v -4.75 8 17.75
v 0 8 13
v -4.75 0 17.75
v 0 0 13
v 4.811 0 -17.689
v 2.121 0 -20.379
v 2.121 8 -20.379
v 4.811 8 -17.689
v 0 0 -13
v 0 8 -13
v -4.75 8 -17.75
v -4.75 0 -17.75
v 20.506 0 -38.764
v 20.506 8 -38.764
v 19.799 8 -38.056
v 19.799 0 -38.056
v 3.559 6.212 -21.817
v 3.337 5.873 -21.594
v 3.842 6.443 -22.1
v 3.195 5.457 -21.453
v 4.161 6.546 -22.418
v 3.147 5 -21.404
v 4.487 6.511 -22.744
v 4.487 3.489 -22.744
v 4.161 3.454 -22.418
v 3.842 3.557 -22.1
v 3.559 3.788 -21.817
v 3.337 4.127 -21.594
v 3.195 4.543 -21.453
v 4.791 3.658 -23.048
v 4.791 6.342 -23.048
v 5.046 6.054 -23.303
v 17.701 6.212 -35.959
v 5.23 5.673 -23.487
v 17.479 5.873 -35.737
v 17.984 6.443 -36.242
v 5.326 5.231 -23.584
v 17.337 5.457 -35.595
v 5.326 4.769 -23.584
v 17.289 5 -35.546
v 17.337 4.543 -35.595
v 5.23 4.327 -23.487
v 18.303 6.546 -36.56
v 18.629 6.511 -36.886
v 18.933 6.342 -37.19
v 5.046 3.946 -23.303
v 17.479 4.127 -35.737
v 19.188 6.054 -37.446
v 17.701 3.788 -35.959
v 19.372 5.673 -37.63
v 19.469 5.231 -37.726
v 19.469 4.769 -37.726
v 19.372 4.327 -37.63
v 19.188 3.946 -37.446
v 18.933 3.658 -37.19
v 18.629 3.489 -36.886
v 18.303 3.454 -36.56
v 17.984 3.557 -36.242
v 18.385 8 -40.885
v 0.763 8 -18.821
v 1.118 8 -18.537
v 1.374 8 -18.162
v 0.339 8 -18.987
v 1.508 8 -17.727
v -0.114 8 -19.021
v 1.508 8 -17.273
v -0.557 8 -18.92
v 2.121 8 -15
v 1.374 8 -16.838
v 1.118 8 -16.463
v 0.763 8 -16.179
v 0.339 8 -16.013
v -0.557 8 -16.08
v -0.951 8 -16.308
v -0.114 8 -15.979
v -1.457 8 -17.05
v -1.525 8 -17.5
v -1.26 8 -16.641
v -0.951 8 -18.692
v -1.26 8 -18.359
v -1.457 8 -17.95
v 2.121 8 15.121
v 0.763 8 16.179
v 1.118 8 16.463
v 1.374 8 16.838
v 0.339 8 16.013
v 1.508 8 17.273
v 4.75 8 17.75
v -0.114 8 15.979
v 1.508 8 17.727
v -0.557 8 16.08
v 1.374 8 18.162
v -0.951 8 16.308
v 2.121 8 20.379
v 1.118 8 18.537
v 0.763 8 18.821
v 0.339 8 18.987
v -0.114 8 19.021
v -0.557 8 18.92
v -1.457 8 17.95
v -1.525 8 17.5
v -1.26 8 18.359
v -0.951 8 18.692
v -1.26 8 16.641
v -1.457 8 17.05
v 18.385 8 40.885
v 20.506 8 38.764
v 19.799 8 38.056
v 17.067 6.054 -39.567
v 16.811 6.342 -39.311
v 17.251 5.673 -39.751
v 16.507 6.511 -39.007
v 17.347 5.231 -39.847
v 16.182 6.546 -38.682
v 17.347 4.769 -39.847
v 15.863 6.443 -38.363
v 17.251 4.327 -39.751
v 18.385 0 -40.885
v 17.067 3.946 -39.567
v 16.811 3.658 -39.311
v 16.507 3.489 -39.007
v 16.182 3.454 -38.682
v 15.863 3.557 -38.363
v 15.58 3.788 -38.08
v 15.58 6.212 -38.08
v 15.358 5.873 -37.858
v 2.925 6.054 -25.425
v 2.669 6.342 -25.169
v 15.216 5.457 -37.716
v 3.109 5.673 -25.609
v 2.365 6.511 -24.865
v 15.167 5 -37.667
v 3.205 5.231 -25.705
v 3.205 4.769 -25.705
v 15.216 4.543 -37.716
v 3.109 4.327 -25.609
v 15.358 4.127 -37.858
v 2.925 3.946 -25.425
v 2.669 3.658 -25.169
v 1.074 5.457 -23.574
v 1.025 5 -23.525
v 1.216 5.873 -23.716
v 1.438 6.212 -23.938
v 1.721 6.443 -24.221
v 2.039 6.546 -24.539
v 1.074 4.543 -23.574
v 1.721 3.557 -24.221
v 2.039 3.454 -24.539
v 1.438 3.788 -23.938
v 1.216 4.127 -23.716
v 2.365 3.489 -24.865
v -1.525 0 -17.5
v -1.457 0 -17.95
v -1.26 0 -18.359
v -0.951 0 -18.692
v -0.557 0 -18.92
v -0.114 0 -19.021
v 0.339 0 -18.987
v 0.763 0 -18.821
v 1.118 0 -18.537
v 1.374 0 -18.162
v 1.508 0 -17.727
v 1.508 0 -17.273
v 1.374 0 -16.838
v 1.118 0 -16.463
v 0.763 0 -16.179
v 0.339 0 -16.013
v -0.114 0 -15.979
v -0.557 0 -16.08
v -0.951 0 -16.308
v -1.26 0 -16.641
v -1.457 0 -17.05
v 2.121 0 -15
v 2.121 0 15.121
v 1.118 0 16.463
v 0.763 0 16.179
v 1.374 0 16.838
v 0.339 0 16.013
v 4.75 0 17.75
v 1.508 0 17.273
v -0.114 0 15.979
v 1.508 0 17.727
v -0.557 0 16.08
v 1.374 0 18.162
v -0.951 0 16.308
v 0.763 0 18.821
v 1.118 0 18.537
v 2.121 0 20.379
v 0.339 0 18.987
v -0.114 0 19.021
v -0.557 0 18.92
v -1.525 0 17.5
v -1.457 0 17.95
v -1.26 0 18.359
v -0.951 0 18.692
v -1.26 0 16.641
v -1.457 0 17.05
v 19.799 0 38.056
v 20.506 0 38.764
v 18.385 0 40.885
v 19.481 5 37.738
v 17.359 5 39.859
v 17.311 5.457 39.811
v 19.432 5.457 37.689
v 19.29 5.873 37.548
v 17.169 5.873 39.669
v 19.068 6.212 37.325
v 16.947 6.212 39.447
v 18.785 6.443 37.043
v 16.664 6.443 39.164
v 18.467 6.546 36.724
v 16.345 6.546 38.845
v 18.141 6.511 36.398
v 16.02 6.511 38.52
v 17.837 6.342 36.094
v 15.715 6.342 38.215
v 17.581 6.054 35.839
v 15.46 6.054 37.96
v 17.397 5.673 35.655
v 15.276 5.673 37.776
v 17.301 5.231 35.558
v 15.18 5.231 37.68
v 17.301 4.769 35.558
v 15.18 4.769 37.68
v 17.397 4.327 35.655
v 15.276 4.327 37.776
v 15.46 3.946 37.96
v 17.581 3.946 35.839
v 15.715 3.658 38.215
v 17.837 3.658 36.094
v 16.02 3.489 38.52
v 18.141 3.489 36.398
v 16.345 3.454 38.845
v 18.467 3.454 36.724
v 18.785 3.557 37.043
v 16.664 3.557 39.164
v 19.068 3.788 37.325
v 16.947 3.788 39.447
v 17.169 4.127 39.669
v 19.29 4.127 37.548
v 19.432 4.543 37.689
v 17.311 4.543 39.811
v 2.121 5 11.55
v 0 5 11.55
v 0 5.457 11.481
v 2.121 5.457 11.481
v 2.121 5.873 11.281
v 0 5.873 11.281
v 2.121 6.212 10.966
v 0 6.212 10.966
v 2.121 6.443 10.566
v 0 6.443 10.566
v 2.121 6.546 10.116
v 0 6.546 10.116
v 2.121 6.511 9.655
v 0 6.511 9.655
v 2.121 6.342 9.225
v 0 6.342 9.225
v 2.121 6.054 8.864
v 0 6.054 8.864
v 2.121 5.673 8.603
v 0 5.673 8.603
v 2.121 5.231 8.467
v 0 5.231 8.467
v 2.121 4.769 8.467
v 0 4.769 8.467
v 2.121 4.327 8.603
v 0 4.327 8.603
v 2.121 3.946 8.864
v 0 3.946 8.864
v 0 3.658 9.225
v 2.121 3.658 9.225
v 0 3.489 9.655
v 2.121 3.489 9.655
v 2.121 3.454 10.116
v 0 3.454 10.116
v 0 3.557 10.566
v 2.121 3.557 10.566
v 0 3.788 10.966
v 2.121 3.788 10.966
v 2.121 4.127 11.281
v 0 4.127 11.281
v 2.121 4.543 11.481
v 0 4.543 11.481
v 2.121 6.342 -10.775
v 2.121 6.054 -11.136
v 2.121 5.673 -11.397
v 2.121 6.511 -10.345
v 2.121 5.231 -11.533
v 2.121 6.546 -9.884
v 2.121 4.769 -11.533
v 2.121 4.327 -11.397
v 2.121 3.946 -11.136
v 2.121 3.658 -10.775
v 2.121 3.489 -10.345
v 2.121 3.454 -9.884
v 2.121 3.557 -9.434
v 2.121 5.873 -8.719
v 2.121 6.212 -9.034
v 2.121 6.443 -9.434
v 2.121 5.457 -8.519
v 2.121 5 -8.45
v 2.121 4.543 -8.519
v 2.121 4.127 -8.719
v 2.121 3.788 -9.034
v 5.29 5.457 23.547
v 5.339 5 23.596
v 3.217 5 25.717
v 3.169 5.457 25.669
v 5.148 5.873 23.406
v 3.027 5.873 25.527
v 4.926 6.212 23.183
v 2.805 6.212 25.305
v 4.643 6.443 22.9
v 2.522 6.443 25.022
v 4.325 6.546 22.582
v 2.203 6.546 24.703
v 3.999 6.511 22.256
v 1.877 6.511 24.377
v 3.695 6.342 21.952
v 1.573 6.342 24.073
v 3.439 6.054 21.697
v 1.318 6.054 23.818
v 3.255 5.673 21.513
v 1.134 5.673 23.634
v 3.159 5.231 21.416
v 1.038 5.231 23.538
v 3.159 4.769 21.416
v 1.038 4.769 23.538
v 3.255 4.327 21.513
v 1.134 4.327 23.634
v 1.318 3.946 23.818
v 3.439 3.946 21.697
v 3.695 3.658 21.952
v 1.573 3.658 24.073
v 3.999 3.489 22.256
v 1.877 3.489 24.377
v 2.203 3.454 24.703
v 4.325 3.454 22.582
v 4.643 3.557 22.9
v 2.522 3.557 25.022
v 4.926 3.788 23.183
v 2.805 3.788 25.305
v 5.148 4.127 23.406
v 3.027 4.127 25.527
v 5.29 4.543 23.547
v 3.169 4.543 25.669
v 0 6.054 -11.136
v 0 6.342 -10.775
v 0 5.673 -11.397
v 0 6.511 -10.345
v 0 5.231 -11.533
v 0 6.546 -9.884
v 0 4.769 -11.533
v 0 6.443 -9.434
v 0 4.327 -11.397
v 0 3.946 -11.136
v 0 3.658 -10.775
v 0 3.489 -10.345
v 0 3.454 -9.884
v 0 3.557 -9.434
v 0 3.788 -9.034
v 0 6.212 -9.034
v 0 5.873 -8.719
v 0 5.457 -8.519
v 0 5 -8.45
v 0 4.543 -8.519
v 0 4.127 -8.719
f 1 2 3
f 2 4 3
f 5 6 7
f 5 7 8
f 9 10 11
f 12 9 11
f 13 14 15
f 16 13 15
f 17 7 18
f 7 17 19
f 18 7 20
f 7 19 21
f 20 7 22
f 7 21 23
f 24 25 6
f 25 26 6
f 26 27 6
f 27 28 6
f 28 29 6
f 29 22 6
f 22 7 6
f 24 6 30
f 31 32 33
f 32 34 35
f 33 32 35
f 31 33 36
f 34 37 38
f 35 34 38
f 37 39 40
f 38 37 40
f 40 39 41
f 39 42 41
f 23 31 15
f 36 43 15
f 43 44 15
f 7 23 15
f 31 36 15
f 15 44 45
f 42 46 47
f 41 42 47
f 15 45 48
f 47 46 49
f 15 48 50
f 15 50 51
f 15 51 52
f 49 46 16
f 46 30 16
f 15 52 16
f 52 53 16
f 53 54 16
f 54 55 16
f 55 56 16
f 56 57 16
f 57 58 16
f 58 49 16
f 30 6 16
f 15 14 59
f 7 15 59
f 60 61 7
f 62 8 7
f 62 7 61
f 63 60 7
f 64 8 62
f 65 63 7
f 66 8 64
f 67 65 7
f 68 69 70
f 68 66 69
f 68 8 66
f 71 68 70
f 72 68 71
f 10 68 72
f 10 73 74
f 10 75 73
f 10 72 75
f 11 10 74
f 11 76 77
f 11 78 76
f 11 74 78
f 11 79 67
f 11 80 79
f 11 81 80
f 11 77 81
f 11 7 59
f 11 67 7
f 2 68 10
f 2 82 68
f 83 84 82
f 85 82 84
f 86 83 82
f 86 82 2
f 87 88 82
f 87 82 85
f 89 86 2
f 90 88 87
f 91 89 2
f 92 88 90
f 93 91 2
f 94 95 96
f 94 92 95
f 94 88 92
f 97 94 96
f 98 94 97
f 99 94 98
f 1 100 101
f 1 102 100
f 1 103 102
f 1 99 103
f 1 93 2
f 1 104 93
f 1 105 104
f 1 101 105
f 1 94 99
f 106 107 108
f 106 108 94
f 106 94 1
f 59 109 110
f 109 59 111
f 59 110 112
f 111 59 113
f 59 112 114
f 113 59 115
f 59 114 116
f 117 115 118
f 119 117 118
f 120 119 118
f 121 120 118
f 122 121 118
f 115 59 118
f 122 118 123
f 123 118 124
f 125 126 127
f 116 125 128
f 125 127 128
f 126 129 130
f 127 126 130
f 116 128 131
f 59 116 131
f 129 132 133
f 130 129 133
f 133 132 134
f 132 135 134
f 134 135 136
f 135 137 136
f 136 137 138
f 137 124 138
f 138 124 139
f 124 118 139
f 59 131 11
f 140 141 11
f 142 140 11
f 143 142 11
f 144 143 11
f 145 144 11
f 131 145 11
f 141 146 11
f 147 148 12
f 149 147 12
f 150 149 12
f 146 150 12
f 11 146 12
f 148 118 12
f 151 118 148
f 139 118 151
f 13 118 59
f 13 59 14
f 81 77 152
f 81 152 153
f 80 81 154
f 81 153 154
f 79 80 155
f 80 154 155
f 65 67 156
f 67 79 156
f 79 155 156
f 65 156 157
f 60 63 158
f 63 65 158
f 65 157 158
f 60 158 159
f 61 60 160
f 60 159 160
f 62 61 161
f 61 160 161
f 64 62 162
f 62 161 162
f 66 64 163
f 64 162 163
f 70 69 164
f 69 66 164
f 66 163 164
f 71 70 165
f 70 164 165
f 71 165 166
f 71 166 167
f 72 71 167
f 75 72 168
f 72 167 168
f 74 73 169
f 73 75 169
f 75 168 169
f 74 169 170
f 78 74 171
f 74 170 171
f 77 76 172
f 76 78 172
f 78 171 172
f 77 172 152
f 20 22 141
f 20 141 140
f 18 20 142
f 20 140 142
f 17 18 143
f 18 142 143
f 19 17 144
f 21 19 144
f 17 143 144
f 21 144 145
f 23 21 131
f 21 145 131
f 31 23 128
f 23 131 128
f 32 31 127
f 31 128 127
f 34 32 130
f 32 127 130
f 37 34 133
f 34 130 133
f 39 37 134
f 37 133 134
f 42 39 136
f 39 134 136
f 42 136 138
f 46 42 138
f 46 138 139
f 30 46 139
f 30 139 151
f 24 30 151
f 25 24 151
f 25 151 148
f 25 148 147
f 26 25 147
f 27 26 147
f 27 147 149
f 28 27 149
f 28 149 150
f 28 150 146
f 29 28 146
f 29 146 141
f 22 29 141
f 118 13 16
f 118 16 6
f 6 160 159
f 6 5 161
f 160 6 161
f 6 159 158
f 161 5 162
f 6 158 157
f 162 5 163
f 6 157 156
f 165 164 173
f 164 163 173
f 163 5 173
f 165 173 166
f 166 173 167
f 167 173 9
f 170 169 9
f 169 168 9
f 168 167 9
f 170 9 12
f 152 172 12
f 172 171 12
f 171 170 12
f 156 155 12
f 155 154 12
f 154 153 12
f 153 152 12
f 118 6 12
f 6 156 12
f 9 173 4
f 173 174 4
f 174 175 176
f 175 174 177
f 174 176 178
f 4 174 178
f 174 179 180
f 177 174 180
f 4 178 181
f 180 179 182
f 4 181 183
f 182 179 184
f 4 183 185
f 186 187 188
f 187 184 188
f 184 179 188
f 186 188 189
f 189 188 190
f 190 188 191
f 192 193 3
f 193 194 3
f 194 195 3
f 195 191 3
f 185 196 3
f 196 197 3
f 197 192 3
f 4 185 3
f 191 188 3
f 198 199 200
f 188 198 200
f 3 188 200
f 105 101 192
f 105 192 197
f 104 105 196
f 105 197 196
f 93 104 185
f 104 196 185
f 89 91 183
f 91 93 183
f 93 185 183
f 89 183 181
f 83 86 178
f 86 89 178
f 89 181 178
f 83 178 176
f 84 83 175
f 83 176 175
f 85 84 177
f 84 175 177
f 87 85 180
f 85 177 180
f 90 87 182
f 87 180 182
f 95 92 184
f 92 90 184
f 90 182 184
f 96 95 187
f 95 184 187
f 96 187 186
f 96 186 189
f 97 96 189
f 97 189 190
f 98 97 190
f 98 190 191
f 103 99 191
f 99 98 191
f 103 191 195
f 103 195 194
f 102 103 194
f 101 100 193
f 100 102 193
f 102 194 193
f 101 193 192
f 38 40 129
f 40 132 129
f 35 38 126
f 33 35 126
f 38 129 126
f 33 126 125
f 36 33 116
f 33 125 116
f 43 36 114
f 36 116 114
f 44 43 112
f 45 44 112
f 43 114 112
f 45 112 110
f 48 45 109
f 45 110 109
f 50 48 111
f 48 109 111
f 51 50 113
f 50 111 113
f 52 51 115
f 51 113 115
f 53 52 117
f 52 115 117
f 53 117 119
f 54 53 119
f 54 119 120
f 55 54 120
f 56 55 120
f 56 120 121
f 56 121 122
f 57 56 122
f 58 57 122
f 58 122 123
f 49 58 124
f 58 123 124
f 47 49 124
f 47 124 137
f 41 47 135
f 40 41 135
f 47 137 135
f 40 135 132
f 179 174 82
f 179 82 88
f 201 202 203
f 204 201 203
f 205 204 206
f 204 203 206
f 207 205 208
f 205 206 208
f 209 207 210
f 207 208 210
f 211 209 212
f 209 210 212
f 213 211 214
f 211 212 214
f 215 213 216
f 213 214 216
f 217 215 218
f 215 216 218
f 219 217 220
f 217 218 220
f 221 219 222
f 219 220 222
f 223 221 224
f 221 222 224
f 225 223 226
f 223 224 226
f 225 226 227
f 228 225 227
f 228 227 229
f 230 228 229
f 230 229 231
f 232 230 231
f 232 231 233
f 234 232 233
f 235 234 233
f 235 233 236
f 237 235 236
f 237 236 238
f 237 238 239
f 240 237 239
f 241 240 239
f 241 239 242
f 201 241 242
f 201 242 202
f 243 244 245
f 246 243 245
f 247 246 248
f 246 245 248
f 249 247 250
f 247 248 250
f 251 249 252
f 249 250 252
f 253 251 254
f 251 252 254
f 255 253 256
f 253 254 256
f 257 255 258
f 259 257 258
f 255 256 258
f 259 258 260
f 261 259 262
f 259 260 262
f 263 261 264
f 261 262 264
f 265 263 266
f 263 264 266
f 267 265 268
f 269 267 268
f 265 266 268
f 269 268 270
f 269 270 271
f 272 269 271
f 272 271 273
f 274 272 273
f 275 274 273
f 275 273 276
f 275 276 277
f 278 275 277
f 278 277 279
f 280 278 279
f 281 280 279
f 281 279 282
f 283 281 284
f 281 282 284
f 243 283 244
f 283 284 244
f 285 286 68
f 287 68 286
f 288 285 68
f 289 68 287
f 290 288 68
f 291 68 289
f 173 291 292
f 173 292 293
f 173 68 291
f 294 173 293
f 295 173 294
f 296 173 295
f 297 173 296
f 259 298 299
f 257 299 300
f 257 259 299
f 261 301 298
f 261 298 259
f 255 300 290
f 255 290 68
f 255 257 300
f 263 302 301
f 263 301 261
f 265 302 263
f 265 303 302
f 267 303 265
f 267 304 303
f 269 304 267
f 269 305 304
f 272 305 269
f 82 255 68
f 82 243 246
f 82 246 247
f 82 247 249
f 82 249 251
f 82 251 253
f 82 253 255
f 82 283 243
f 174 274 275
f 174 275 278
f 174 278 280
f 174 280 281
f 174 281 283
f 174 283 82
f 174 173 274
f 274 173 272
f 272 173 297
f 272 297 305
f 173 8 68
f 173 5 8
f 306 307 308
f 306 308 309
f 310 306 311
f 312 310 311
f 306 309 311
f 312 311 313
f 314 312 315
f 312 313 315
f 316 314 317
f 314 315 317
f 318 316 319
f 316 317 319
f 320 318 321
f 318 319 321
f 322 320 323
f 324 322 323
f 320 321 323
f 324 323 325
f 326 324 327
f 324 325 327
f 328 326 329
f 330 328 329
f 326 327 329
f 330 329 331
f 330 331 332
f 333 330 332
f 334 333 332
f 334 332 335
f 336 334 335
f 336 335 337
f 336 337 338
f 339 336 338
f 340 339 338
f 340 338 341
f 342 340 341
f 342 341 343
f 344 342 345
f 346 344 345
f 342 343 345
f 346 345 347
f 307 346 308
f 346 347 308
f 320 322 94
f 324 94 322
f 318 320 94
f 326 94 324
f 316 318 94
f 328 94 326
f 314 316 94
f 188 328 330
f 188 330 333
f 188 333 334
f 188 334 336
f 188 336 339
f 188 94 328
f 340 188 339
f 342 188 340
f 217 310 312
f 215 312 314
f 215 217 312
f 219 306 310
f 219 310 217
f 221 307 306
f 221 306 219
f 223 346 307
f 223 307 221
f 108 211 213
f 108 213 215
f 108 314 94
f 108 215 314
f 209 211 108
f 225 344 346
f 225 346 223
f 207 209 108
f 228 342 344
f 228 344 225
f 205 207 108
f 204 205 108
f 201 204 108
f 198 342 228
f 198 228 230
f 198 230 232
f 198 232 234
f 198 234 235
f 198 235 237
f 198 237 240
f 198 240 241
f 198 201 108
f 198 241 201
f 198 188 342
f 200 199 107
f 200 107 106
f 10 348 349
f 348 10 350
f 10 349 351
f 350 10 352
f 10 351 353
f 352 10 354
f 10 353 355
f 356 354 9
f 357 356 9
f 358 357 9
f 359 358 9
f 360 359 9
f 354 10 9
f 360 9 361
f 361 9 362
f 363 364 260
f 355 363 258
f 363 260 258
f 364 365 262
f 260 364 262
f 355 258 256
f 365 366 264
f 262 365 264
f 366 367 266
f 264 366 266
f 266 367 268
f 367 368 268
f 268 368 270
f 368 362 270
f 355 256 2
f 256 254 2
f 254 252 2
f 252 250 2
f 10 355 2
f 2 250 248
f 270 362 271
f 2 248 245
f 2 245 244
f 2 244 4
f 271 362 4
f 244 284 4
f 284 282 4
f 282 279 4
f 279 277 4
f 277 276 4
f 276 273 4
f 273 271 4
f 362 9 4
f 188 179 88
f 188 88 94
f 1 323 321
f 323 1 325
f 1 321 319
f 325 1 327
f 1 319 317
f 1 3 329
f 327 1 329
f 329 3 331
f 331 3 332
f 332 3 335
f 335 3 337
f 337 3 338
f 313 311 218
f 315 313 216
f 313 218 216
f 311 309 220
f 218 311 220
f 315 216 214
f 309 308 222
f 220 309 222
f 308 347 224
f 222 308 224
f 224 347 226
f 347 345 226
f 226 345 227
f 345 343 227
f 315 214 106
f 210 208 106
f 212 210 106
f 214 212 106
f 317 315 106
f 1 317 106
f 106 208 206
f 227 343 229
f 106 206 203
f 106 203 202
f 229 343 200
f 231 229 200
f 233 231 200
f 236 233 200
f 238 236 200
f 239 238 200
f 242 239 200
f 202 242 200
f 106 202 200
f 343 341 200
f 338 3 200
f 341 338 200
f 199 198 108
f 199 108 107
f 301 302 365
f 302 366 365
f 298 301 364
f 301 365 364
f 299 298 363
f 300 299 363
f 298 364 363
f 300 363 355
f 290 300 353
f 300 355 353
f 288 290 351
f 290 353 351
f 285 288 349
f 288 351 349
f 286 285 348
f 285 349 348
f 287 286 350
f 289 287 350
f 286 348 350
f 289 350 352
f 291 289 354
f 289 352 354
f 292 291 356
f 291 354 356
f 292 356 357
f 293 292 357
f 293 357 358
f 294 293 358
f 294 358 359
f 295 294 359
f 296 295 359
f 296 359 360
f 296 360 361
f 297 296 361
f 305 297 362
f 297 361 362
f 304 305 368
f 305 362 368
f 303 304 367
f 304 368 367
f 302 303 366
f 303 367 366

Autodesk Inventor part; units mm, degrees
ref_plane "YZ Plane" through (0, 0, 0) normal (1, 0, 0) x (0, 1, 0)
ref_plane "XZ Plane" through (0, 0, 0) normal (0, 1, 0) x (-1, 0, 0)
ref_plane "XY Plane" through (0, 0, 0) normal (0, 0, 1) x (1, 0, 0)
sketch "Sketch1" plane through (0, 0, 0) normal (0, 1, 0) x (-1, 0, 0)
  line L0 (0, 22.5) -> (-17.6777, 40.1777)
  line L1 (0, -22.5) -> (-17.6777, -40.1777)
  line L2 (0, 0) -> (0, 13)
  line L3 (0, 13) -> (0, -13)
  line L4 (-17.6777, 40.1777) -> (-19.799, 38.0563)
  line L5 (0, 22.5) -> (-2.1213, 20.3787)
  line L6 (-2.1213, 20.3787) -> (-19.799, 38.0563)
  line L7 (-2.1213, -20.3787) -> (-19.799, -38.0563)
  line L8 (-19.799, -38.0563) -> (-17.6777, -40.1777)
  line L9 (-2.1213, -20.3787) -> (0, -22.5)
  circle A0 centre (0, -17.5) radius 1.525
  circle A1 centre (0, 17.5) radius 1.525
  line L10 (0, -22.5) -> (2, -20.5)
  line L11 (0, -13) -> (2, -15)
  line L12 (0, 22.5) -> (2, 20.5)
  line L13 (0, 13) -> (2, 15)
  line L14 (0, -22.5) -> (-18.3848, -40.8848)
  line L15 (-18.3848, -40.8848) -> (-20.5061, -38.7635)
  line L16 (-20.5061, -38.7635) -> (-19.799, -38.0563)
  line L17 (-19.799, 38.0563) -> (-20.5061, 38.7635)
  line L18 (-20.5061, 38.7635) -> (-18.3848, 40.8848)
  line L19 (-18.3848, 40.8848) -> (-17.6777, 40.1777)
  line L20 (0, -13) -> (-2.1213, -15)
  line L21 (-2.1213, -20.3787) -> (-4.8107, -17.6893)
  line L22 (-2.1213, -20.3787) -> (1.682, -20.3787) construction
  line L23 (-4.8107, -17.6893) -> (-2.1213, -15)
  line L24 (2, -20.5) -> (4.75, -17.75)
  line L25 (4.75, -17.75) -> (2, -15)
  line L26 (0, 13) -> (-2.1213, 15.1213)
  line L27 (-2.1213, 15.1213) -> (-4.75, 17.75)
  line L28 (-4.75, 17.75) -> (-2.1213, 20.3787)
  line L29 (2, 15) -> (4.75, 17.75)
  line L30 (4.75, 17.75) -> (2, 20.5)
  line L31 (-2.1213, -15) -> (-2.1213, 15.1213)
  dimension "d3" = 25
  dimension "d6" = 25
  dimension "d8" = 13
  dimension "d9" = 26
  dimension "d10" = 3
  dimension "d12" = 3.05
  dimension "d13" = 3.05
  dimension "d16" = 26
  dimension "d17" = 135
extrude "Extrusion2" add sketch "Sketch1" along normal blind 8
sketch "Sketch3" plane through (0, 0, -13) normal (-1, 0, 0) x (0, 0, 1)
  point P0 (13, 0)
sketch "Sketch4" plane through (0, 0, -13) normal (-1, 0, 0) x (0, 0, 1)
  line L0 (13, 0) -> (13, 5)
  line L1 (13, 5) -> (3, 5)
  line L2 (3, 5) -> (23, 5)
  circle A0 centre (3, 5) radius 1.55
  circle A1 centre (23, 5) radius 1.55
  dimension "d20" = 5
  dimension "d21" = 10
  dimension "d22" = 20
  dimension "d23" = 3.1
  dimension "d24" = 3.1
extrude "Extrusion3" cut sketch "Sketch4" against normal blind 8
sketch "Sketch5" plane through (-4.75, 0, -17.75) normal (-0.7071, 0, -0.7071) x (-0.7071, 0, 0.7071)
  line L0 (-6.7175, 0) -> (-32.7175, 0) projected
  line L1 (-32.7175, 0) -> (-6.7175, 0)
  line L2 (-19.7175, 0) -> (-19.7175, 5)
  line L3 (-19.7175, 5) -> (-29.7175, 5)
  line L4 (-29.7175, 5) -> (-9.7175, 5)
  circle A0 centre (-29.7175, 5) radius 1.55
  circle A1 centre (-9.7175, 5) radius 1.55
  point P0 (9.1924, 0)
  dimension "d27" = 5
  dimension "d28" = 10
  dimension "d29" = 20
  dimension "d30" = 3.1
  dimension "d31" = 3.1
extrude "Extrusion4" cut sketch "Sketch5" against normal blind 8
sketch "Sketch6" plane through (18.3848, 0, 40.8848) normal (-0.7071, 0, 0.7071) x (0.7071, 0, 0.7071)
  line L0 (-32.7175, 0) -> (0, 0) projected
  line L1 (0, 0) -> (-26, 0)
  line L2 (0, 0) -> (-13, 0)
  line L3 (-13, 0) -> (-13, 5)
  line L4 (-13, 5) -> (-23, 5)
  line L5 (-23, 5) -> (-3, 5)
  circle A0 centre (-23, 5) radius 1.55
  circle A1 centre (-3, 5) radius 1.55
  point P0 (-41.9099, 0)
  dimension "d34" = 26
  dimension "d35" = 13
  dimension "d36" = 5
  dimension "d37" = 10
  dimension "d38" = 20
  dimension "d39" = 3.1
  dimension "d40" = 3.1
extrude "Extrusion5" cut sketch "Sketch6" against normal blind 8
properties part number "distanceSensorMount"
